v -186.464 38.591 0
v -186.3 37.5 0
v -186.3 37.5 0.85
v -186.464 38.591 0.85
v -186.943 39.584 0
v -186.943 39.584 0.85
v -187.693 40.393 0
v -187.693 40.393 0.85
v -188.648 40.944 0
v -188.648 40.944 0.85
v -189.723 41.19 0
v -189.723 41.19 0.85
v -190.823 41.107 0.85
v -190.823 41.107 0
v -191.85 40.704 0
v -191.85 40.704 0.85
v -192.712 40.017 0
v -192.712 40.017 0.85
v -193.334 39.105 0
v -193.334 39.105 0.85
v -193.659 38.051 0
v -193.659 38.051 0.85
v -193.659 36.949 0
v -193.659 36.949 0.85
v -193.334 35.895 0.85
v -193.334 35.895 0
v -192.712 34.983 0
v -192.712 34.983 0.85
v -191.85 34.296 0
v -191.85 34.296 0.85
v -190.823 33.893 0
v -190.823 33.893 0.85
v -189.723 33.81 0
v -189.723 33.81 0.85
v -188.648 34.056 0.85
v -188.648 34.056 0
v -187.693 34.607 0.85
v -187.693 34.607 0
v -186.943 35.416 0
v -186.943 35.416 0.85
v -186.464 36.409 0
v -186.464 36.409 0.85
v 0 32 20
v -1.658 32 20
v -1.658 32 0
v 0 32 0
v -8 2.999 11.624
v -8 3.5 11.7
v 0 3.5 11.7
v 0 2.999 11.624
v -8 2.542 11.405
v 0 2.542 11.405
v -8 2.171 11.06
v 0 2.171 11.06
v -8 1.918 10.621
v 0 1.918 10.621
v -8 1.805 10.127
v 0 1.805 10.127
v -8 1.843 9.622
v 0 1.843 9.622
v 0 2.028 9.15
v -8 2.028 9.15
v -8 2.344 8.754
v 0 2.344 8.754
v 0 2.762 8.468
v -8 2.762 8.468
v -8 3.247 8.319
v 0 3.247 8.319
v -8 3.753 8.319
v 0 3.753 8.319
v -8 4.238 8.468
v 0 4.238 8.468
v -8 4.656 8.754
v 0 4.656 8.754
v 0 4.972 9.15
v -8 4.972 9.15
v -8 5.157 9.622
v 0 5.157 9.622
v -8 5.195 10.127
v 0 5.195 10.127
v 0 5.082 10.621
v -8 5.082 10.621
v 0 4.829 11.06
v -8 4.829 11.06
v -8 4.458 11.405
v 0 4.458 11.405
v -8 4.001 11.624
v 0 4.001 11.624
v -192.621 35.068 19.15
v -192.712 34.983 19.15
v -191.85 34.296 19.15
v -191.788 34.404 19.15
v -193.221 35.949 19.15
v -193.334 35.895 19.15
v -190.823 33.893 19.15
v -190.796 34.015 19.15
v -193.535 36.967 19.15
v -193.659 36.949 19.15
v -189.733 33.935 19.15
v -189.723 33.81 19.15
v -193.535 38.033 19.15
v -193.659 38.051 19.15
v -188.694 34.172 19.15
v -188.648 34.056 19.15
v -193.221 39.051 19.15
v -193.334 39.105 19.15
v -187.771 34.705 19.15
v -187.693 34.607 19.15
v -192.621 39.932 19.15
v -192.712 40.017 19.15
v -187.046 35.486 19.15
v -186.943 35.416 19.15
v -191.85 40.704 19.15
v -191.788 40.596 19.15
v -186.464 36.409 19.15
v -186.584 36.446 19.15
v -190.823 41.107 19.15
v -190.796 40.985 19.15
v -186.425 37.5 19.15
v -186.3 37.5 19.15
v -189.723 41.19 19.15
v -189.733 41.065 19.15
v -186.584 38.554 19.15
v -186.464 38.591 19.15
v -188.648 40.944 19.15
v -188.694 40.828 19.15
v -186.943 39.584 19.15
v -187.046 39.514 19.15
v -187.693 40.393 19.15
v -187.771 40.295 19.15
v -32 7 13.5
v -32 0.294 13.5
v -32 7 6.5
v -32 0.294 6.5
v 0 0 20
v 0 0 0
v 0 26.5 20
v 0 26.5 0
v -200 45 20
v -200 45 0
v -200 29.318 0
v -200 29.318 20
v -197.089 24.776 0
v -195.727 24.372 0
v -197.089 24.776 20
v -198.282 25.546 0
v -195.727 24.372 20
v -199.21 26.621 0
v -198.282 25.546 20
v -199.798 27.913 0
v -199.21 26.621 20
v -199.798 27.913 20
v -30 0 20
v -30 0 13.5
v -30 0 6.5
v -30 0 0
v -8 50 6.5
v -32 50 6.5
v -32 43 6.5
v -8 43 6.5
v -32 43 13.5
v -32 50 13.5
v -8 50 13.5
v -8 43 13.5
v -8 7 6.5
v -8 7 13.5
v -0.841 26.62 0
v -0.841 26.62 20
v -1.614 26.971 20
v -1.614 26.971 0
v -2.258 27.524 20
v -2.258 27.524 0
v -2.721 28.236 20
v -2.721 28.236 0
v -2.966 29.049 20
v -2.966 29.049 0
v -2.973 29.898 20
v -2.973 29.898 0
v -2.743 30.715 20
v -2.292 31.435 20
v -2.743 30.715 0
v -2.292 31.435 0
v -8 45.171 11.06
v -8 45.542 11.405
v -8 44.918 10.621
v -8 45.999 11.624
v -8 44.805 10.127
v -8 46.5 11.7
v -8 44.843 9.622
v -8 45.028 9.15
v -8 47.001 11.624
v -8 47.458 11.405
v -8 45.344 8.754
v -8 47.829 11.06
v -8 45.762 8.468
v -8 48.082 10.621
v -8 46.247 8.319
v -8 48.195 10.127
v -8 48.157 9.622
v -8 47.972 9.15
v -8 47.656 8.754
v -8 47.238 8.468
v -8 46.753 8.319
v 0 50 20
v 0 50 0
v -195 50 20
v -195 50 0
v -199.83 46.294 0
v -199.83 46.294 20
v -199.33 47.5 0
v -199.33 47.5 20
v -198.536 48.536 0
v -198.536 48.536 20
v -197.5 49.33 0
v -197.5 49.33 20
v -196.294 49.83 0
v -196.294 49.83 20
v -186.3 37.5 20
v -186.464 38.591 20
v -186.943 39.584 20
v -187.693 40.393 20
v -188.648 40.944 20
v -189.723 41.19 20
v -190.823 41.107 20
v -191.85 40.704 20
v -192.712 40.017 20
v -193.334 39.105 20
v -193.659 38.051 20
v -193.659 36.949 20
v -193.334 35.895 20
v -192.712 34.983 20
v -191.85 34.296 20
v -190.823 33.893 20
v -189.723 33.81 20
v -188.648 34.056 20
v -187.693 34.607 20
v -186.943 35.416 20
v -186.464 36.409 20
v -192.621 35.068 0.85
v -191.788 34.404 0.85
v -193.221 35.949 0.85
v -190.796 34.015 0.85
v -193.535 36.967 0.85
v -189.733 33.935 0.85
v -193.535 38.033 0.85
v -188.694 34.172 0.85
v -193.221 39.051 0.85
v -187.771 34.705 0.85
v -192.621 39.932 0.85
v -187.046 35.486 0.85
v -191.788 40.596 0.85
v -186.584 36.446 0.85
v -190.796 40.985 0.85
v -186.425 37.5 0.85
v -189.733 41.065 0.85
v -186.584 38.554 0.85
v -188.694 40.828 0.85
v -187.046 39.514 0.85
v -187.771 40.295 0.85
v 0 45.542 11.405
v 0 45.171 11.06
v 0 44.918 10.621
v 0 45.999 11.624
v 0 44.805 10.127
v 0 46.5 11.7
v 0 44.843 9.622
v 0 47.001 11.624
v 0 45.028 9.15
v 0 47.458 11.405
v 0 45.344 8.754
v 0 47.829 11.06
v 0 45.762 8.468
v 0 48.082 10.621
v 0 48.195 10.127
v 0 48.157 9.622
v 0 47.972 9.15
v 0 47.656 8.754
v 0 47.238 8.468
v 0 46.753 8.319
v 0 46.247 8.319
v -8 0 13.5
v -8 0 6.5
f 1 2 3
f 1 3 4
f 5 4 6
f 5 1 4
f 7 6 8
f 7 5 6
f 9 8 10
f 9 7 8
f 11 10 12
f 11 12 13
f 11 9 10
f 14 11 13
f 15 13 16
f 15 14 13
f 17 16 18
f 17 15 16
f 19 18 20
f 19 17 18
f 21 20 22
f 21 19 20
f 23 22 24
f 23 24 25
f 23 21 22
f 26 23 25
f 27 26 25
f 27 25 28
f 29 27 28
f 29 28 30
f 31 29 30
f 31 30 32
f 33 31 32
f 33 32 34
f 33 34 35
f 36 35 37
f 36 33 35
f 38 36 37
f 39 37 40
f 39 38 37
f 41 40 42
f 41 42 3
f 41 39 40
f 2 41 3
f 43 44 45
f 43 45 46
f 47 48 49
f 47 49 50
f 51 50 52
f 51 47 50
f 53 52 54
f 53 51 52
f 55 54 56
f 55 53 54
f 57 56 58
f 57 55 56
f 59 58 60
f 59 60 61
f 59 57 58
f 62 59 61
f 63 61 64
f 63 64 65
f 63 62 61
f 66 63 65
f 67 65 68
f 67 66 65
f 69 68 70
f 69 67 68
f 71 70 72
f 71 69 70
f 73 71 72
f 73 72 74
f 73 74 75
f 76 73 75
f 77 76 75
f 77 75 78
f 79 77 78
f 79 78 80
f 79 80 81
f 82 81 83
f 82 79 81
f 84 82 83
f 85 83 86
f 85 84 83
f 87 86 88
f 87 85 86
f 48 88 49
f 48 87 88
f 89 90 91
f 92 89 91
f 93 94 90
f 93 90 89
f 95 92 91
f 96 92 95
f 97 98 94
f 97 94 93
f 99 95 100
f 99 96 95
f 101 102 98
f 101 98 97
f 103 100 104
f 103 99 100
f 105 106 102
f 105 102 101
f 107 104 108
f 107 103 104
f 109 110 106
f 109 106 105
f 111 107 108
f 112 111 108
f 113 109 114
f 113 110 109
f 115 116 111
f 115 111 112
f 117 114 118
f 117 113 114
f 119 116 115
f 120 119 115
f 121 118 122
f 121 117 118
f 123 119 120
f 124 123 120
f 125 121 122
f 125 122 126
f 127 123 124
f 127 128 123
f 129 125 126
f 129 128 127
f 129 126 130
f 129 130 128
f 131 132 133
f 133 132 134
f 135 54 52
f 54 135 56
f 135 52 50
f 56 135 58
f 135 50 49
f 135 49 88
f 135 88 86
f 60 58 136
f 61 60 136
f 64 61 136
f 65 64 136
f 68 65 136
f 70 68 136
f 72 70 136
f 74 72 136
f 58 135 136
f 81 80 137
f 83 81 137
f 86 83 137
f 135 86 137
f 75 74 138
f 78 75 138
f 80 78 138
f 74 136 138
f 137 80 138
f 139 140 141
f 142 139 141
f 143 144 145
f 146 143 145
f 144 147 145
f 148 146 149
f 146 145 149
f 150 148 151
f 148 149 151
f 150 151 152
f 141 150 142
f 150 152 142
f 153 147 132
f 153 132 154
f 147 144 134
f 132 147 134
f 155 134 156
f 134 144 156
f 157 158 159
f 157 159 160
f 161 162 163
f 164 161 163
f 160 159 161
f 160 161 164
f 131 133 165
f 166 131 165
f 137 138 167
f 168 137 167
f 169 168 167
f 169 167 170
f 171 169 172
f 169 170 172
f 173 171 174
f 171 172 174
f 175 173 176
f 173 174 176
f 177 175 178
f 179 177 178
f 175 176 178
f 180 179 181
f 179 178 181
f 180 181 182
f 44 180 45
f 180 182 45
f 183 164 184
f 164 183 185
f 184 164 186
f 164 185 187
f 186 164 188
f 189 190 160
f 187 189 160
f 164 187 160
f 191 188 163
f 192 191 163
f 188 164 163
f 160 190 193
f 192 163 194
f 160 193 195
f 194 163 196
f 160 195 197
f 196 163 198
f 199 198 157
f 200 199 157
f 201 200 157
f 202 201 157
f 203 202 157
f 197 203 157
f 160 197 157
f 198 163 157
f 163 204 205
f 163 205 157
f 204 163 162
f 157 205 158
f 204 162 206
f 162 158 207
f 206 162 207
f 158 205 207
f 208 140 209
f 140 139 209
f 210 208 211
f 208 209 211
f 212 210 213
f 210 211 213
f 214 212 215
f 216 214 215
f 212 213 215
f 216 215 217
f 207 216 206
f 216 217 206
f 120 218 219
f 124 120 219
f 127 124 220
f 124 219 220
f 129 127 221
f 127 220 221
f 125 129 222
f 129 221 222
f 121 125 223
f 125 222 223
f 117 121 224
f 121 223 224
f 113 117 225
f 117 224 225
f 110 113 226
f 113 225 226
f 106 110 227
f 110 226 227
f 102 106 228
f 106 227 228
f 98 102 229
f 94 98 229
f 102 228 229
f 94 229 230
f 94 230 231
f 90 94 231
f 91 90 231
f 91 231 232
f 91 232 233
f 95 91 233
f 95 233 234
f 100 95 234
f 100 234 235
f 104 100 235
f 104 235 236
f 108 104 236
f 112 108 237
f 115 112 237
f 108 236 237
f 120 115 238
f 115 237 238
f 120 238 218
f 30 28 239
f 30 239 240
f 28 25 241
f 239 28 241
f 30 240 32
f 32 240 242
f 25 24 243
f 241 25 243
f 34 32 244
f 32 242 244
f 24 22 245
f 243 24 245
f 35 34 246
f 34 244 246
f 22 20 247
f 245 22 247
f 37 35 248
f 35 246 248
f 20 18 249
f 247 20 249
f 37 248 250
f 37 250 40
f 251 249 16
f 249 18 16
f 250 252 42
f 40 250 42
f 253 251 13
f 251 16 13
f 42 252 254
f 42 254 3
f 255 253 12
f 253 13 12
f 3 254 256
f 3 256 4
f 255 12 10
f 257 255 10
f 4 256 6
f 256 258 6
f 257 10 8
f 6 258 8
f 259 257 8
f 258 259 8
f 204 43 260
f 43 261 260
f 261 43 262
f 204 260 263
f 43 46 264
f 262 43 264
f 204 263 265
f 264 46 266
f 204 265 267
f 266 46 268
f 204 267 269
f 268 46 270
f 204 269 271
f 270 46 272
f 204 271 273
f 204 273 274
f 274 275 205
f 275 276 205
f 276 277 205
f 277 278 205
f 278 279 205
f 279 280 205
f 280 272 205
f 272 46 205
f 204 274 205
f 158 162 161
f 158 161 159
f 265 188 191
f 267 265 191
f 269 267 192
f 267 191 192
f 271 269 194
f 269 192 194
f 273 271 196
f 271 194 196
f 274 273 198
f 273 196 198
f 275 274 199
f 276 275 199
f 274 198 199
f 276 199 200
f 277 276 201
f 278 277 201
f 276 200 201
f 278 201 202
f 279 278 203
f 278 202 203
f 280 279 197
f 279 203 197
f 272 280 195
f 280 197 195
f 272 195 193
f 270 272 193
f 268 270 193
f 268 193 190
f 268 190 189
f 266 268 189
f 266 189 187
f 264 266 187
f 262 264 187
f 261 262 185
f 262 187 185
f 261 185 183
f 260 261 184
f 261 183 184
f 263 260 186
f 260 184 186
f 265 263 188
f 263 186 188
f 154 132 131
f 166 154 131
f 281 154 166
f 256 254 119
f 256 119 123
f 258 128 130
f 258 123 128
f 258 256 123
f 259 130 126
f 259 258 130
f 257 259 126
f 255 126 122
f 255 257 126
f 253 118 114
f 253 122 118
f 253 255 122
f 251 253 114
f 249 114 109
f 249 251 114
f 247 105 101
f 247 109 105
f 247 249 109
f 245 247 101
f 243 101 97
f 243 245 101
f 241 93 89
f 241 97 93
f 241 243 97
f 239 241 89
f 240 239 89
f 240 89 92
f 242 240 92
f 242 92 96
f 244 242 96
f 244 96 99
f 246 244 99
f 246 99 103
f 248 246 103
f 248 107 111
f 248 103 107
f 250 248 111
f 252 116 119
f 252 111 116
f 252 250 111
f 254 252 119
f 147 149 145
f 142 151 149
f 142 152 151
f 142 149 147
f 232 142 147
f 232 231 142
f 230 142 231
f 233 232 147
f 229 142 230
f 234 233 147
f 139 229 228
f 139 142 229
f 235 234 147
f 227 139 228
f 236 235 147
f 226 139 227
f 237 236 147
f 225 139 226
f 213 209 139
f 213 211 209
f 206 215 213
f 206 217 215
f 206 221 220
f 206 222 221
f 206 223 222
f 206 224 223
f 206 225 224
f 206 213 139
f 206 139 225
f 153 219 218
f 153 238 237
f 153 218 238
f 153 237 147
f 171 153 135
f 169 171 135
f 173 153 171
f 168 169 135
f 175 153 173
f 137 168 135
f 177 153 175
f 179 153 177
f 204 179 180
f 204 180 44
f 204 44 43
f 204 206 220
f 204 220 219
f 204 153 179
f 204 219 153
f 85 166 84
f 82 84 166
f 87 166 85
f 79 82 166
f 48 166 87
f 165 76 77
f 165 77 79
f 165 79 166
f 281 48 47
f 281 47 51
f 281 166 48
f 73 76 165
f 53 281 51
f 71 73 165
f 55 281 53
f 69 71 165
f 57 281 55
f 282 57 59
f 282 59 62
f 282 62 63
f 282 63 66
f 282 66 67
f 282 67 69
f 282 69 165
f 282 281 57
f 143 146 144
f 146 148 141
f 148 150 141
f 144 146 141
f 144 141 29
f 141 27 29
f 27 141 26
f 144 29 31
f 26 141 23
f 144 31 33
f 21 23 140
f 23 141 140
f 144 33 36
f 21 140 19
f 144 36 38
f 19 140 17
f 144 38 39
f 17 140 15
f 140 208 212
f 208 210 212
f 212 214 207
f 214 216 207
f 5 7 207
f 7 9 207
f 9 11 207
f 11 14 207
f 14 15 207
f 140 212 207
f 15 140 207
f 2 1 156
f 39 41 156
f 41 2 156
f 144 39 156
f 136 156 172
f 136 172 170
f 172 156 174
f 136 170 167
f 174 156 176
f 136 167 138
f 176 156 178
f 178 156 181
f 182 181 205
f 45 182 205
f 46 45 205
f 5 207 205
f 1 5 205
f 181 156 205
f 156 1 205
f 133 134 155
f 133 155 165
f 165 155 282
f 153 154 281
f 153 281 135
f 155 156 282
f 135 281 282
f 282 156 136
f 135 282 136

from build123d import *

# Parameters (mm, degrees)
SKETCH1_R           = 3.575
BOSS_EXTRUDE1_DEPTH = 20
FILLET1_R           = 5
SKETCH5_W           = 24
SKETCH5_H           = 7
CUT_EXTRUDE1_DEPTH  = 7
SKETCH6_R           = 1.7
CUT_EXTRUDE2_DEPTH  = 8
SKETCH3_R           = 3.7
CUT_EXTRUDE3_DEPTH  = 0.85


with BuildPart() as part:
    # Sketch1 → Boss-Extrude1 (new body)
    with BuildSketch(Plane.XY):
        with BuildLine():
            Line((-200, 25), (-30, 0))
            Line((-30, 0), (0, 0))
            Line((0, 0), (0, 26.5))
            ThreePointArc((0, 26.5), (-2.872281323, 28.633974596), (-1.658312395, 32))
            Line((-1.658312395, 32), (0, 32))
            Line((0, 32), (0, 32.5))
            Line((0, 32.5), (0, 50))
            Line((0, 50), (-200, 50))
            Line((-200, 50), (-200, 25))
        make_face()
        with Locations((-190, 37.5)):
            Circle(SKETCH1_R, mode=Mode.SUBTRACT)
    extrude(amount=BOSS_EXTRUDE1_DEPTH)

    # Fillet1
    fillet1_edges = [part.edges().sort_by_distance(p)[0] for p in [
        (-200, 25, 10),
        (-200, 50, 10),
    ]]
    fillet(fillet1_edges, radius=FILLET1_R)

    # Sketch5 → Cut-Extrude1 (cut)
    with BuildSketch(Plane(origin=(0, 50, 0), x_dir=(1, 0, 0), z_dir=(0, 1, 0))):
        with Locations((-20, -10)):
            Rectangle(SKETCH5_W, SKETCH5_H)
    cut_extrude1 = extrude(amount=-CUT_EXTRUDE1_DEPTH, mode=Mode.SUBTRACT)

    # Sketch6 → Cut-Extrude2 (cut)
    with BuildSketch(Plane.ZY.offset(8)):
        with Locations((10, 46.5)):
            Circle(SKETCH6_R)
    cut_extrude2 = extrude(amount=-CUT_EXTRUDE2_DEPTH, mode=Mode.SUBTRACT)

    # Mirror1: Cut-Extrude1, Cut-Extrude2 across plane
    add(cut_extrude1.mirror(Plane.ZX.offset(25)), mode=Mode.SUBTRACT)
    add(cut_extrude2.mirror(Plane.ZX.offset(25)), mode=Mode.SUBTRACT)

    # Sketch3 → Cut-Extrude3 (cut)
    with BuildSketch(Plane.XY.offset(20)):
        with Locations((-190, 37.5)):
            Circle(SKETCH3_R)
    cut_extrude3 = extrude(amount=-CUT_EXTRUDE3_DEPTH, mode=Mode.SUBTRACT)

    # Mirror2: Cut-Extrude3 across plane
    add(cut_extrude3.mirror(Plane.XY.offset(10)), mode=Mode.SUBTRACT)


solid = part.part
